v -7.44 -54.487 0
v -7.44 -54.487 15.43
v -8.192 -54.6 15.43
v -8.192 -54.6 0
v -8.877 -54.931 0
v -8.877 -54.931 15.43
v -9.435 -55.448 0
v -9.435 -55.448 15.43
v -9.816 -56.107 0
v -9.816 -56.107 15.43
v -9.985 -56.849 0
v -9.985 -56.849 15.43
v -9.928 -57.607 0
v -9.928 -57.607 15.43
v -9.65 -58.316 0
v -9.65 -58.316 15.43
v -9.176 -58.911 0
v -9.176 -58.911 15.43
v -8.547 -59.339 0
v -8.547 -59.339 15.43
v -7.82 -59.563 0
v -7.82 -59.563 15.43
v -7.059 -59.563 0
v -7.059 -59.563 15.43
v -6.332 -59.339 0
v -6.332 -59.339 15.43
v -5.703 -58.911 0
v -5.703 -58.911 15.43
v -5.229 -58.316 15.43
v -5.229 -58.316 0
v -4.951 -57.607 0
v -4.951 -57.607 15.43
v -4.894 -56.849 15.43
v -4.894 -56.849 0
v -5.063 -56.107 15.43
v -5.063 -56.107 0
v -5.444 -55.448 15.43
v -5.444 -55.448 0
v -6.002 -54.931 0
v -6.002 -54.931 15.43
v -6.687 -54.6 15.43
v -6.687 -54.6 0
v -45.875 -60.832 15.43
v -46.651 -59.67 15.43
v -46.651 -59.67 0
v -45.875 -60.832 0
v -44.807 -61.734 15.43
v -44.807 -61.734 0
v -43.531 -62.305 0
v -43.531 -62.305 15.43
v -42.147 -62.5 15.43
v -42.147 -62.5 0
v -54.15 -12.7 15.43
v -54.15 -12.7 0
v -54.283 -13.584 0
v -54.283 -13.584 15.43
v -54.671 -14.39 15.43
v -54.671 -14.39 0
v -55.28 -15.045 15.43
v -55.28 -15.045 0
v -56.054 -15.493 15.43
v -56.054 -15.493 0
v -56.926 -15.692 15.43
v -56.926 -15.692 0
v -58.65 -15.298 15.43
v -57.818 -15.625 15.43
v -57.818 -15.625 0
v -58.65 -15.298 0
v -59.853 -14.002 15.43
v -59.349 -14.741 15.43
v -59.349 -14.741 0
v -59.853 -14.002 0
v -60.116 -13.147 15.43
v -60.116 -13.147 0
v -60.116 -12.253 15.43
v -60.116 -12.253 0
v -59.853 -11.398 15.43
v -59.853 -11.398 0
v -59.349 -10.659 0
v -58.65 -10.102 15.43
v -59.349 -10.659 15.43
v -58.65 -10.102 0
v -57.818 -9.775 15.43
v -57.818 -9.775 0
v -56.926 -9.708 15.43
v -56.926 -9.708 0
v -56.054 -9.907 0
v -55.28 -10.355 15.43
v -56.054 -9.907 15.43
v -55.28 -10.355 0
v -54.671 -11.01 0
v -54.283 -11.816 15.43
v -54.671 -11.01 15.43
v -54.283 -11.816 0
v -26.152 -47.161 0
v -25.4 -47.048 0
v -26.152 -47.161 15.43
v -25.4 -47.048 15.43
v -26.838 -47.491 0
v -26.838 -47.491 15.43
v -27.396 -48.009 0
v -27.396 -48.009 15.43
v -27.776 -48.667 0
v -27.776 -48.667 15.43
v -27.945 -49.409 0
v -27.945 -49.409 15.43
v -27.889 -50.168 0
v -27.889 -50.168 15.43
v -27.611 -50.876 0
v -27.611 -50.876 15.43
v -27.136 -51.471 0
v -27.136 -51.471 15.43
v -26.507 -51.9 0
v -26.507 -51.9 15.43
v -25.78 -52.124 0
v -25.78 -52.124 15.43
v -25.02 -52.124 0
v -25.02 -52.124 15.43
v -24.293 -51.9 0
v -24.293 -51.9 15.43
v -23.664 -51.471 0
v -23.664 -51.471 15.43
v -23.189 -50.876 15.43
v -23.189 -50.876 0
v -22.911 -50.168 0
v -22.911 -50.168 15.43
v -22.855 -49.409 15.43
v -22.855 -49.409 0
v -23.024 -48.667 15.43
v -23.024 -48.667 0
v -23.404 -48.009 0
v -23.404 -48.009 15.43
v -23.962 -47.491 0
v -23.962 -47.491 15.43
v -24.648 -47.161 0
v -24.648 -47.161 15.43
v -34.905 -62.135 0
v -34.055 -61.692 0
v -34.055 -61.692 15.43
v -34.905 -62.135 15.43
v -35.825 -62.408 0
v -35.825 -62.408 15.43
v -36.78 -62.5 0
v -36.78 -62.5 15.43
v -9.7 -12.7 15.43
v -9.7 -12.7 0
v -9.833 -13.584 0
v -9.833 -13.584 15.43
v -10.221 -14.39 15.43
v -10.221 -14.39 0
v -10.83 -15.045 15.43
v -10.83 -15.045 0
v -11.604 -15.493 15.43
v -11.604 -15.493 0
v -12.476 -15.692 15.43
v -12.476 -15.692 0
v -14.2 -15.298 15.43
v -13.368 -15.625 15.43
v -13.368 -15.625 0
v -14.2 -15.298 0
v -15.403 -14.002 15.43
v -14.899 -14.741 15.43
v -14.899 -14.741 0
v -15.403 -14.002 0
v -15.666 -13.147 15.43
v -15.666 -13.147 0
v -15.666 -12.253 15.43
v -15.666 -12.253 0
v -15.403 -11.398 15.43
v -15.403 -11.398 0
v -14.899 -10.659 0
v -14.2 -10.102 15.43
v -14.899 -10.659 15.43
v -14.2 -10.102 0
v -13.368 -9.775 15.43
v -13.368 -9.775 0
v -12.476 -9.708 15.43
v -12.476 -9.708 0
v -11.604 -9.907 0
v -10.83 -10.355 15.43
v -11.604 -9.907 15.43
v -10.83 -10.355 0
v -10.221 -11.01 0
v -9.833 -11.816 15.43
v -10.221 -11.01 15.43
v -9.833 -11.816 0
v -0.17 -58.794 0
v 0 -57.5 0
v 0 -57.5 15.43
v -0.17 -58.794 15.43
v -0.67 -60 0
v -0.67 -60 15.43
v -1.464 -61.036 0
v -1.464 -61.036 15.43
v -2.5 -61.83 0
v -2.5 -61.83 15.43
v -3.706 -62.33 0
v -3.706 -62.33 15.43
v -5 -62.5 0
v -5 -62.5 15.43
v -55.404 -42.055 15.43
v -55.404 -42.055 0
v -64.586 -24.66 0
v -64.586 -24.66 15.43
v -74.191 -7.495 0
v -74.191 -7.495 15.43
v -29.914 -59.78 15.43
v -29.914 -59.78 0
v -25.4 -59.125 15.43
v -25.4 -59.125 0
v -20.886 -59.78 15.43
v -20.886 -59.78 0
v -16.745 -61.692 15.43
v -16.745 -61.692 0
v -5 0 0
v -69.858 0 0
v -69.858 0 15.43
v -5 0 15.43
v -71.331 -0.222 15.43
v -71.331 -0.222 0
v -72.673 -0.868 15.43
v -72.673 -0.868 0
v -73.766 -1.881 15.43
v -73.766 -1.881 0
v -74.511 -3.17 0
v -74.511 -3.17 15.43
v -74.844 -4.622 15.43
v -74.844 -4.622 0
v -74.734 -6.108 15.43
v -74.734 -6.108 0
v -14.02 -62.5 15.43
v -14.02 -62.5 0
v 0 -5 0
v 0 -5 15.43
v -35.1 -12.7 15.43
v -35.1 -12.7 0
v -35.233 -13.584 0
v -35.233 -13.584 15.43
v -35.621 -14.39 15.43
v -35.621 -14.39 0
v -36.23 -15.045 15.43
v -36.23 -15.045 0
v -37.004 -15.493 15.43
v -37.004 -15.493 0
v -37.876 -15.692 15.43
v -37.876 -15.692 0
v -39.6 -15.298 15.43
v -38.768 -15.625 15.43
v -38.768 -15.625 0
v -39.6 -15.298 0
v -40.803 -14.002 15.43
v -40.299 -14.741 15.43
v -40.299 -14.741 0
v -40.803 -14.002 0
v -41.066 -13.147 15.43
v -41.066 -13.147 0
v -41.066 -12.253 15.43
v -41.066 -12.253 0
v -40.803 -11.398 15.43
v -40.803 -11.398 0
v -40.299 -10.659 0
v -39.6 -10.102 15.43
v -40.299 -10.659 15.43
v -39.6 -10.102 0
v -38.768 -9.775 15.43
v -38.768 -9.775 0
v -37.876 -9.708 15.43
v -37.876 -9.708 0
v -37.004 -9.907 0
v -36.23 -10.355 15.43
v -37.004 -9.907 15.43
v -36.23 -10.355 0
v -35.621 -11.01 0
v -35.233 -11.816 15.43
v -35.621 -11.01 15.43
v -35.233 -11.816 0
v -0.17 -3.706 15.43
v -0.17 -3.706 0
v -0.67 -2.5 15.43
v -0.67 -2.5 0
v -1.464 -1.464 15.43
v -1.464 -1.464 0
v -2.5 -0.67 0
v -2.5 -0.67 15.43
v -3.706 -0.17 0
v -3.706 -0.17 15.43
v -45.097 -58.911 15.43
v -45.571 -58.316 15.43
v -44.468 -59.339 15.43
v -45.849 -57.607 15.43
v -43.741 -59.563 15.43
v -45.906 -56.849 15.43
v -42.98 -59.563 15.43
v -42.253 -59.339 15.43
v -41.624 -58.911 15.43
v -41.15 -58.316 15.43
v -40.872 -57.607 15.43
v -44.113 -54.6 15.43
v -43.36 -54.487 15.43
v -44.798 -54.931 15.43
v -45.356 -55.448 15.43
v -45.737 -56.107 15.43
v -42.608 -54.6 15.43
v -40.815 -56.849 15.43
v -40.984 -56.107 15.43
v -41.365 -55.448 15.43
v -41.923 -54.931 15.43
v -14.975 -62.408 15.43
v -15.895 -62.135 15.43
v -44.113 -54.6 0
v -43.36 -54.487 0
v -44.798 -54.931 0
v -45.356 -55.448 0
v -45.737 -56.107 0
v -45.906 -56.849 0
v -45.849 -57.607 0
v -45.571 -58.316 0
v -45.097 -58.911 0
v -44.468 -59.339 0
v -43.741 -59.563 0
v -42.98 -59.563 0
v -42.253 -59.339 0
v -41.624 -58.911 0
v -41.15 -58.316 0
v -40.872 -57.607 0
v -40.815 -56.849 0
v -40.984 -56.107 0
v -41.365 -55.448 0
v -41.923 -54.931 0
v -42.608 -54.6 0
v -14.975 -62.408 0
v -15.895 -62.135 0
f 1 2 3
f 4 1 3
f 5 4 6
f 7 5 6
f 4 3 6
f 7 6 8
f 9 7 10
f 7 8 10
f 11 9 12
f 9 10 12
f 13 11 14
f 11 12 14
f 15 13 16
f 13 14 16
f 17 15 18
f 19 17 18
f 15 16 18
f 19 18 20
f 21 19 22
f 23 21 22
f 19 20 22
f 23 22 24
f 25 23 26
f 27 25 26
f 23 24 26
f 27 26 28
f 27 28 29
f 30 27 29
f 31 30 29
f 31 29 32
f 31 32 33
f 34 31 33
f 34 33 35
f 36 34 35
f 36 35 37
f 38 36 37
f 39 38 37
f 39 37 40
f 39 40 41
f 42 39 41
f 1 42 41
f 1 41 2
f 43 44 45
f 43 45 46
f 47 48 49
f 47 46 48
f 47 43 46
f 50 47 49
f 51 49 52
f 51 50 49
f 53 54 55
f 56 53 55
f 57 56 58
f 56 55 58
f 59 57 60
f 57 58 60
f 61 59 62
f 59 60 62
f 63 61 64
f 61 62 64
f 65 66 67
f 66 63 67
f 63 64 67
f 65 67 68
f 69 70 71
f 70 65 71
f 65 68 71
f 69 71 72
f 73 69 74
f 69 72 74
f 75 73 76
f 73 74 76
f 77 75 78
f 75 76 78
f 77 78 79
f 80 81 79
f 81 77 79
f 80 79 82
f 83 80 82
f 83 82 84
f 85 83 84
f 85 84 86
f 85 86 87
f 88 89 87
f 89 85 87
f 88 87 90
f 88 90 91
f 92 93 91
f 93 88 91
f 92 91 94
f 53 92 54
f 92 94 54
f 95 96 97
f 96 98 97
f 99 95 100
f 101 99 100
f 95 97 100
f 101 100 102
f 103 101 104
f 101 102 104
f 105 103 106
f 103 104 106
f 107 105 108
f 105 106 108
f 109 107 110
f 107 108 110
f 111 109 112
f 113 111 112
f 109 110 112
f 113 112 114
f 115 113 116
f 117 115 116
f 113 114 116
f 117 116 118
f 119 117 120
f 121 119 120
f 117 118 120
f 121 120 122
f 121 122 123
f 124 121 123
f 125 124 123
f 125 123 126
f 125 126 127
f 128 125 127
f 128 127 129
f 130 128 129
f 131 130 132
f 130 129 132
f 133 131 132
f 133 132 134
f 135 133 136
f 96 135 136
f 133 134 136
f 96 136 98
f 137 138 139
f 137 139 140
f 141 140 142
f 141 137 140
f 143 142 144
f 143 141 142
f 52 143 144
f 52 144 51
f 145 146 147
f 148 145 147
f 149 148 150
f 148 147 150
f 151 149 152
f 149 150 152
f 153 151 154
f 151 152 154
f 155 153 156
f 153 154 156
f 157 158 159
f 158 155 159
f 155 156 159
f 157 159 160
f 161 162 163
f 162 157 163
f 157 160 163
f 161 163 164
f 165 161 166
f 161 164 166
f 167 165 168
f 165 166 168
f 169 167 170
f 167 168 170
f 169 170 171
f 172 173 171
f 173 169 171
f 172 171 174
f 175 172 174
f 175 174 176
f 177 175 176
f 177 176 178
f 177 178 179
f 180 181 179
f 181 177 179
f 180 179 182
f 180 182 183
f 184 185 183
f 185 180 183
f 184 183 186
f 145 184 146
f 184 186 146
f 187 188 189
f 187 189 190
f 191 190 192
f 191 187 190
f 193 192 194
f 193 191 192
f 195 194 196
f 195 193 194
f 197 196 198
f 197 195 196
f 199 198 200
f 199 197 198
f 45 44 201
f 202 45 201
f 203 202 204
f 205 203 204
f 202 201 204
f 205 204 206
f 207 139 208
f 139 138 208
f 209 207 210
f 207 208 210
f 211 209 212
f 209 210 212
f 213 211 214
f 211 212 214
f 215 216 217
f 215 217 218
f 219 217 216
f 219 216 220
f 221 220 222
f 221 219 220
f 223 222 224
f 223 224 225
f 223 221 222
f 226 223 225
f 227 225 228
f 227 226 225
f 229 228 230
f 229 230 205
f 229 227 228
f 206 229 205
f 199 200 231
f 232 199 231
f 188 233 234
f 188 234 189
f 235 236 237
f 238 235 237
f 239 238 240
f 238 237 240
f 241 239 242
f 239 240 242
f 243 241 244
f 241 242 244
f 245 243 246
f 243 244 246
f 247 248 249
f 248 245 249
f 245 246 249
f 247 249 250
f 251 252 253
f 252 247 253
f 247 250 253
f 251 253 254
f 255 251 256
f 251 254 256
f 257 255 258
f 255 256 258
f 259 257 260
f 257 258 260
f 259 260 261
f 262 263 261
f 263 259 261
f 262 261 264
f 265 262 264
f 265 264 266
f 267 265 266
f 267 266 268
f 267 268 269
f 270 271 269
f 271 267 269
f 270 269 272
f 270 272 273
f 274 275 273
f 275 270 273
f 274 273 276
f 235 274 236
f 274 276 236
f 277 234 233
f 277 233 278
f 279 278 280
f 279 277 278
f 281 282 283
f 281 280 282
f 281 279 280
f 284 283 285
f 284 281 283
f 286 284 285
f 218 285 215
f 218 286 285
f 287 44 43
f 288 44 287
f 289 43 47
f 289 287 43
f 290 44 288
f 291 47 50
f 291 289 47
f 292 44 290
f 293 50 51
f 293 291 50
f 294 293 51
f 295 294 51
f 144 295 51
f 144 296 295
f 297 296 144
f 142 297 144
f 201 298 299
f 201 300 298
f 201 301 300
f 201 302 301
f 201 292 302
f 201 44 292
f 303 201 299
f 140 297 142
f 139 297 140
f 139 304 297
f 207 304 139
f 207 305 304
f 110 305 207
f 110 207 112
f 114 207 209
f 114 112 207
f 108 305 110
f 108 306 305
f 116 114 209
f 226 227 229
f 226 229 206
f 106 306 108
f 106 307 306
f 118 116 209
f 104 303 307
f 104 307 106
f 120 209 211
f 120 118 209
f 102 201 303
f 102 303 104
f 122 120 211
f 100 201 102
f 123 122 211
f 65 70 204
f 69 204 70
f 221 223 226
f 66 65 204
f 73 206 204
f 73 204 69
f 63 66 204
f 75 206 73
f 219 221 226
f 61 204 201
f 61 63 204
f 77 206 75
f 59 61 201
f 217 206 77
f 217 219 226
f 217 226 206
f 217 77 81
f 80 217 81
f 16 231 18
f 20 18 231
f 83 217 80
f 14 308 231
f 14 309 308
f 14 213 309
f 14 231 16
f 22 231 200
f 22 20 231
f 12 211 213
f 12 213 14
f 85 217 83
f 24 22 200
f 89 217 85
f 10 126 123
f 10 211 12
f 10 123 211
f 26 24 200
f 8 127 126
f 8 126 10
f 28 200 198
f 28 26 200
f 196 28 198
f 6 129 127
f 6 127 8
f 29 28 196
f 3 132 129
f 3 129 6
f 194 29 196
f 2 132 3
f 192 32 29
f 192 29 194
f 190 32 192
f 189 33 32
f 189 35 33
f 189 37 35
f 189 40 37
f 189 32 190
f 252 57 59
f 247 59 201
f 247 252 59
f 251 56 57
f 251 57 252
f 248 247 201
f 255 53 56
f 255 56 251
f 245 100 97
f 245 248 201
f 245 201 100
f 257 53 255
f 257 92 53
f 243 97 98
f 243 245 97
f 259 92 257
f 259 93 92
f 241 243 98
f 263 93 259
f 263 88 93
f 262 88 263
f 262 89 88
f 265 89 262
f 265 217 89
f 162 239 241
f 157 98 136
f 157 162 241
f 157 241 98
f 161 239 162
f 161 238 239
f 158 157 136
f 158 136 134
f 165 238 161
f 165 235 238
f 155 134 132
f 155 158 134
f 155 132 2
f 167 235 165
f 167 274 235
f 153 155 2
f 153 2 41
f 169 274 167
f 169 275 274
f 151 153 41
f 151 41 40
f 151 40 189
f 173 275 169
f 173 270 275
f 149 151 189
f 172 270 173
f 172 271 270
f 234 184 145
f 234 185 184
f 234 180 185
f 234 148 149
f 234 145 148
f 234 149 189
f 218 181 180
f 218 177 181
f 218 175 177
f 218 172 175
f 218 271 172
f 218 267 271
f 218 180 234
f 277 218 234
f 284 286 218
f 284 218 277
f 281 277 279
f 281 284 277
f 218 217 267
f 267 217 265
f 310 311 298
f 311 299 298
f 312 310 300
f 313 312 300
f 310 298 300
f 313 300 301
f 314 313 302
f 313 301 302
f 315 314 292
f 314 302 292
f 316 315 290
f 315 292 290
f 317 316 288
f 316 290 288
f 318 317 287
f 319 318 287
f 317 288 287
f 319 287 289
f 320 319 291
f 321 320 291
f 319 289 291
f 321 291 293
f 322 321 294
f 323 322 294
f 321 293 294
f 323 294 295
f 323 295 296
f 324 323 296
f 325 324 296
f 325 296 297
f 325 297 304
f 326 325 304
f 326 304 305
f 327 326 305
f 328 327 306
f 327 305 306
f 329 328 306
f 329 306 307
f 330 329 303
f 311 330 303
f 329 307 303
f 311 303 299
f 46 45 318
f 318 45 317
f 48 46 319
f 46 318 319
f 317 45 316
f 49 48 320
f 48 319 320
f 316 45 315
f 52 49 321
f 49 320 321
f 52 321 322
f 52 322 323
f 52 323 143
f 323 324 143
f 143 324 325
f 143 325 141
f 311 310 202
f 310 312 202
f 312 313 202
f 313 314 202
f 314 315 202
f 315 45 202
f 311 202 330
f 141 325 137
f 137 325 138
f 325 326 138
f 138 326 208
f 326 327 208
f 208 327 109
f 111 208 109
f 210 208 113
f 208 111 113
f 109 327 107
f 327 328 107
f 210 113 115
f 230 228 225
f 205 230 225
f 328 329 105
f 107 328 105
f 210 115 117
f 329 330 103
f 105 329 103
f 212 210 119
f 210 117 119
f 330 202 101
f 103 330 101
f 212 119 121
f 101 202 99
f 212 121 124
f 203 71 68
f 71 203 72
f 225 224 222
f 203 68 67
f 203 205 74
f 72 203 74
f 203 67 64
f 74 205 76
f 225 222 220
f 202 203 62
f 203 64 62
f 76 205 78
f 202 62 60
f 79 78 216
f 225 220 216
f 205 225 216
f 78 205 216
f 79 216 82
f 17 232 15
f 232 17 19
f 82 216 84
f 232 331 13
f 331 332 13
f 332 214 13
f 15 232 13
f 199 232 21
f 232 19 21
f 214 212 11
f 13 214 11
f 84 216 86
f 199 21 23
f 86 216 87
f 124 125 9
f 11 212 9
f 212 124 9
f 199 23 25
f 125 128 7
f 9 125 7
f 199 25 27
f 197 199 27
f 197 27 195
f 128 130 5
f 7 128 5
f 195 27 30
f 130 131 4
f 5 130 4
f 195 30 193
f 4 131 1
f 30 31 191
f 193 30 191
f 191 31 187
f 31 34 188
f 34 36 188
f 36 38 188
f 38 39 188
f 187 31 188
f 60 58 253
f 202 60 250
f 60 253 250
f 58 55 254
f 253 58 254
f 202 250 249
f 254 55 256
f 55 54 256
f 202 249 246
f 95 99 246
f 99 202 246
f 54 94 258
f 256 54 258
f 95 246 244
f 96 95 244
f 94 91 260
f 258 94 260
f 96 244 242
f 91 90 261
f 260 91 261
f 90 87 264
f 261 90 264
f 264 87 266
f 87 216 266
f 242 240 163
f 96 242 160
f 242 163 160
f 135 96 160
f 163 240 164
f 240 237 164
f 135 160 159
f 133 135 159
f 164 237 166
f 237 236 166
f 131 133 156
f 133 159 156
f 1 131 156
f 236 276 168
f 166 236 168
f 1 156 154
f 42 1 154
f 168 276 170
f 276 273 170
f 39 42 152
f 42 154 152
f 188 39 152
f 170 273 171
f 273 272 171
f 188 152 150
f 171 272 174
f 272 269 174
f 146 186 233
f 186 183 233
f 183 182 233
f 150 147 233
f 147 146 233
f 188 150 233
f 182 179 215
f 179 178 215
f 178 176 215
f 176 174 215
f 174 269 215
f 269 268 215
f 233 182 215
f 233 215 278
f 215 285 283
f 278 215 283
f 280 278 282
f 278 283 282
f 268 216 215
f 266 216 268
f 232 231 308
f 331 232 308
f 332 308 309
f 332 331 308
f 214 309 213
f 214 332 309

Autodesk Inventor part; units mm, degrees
ref_plane "YZ Plane" through (0, 0, 0) normal (1, 0, 0) x (0, 1, 0)
ref_plane "XZ Plane" through (0, 0, 0) normal (0, 1, 0) x (-1, 0, 0)
ref_plane "XY Plane" through (0, 0, 0) normal (0, 0, 1) x (1, 0, 0)
sketch "Sketch1" plane through (0, 0, 0) normal (0, 0, 1) x (1, 0, 0)
  line L0 (-110, -20.8494) -> (-110, 0)
  line L1 (-110, 0) -> (0, 0)
  line L2 (0, 0) -> (0, -105)
  line L3 (0, -105) -> (-39.3892, -105)
  line L4 (-110, -20.8494) -> (-119.38, 0) construction
  line L5 (-119.38, 0) -> (-110, 0) construction
  line L6 (-50.8, -25.4) -> (0, -25.4) construction
  line L7 (0, -25.4) -> (0, 0) construction
  line L8 (0, 0) -> (-50.8, 0) construction
  line L9 (-50.8, 0) -> (-50.8, -25.4) construction
  line L10 (-50.8, -25.4) -> (0, 0) construction
  line L11 (0, -25.4) -> (-50.8, 0) construction
  circle A0 centre (-12.7, -12.7) radius 3
  circle A1 centre (-38.1, -12.7) radius 3
  circle A2 centre (-25.4, -75) radius 15.875
  circle A3 centre (-25.4, -75) radius 30
  line L12 (-50.8, -90.9637) -> (-50.8, -59.0363)
  line L13 (-110, -4.7091) -> (-83.2932, 0)
  arc A4 (-56.3982, -84.7295) -> (-61.7755, -78.3211) centre (-62.3821, -84.2903) ccw
  line L14 (-39.3892, -105) -> (-56.3982, -84.7295)
  arc A5 (-85.9963, -49.4559) -> (-100.0831, -32.6679) centre (-102.5, -49) ccw
  line L15 (-61.7755, -78.3211) -> (-85.9963, -49.4559)
  line L16 (-100.0831, -32.6679) -> (-110, -20.8494)
  circle A6 centre (-95.25, -12.7) radius 3
  circle A7 centre (-57.15, -12.7) radius 3
  point P0 (0, 0)
  point P1 (-25.4, -12.7)
  point P2 (-25.4, -25.4)
  point P3 (-50.8, -75)
  point P4 (0, -90.9637)
  point P5 (-110, -10.4247)
  point P6 (-48.3813, -94.2836)
  point P7 (0, -59.0363)
  point P8 (-25.4, -105)
  dimension "d1" = 119.38
  dimension "d2" = 50.8
  dimension "d3" = 25.4
  dimension "d4" = 25.4
  dimension "d5" = 12.7
  dimension "d6" = 6
  dimension "d7" = 6
  dimension "d11" = 110
  dimension "d12" = 60
  dimension "d13" = 25.4
  dimension "d14" = 25.4
  dimension "d17" = 20.8494
  dimension "d18" = 31.75
  dimension "d21" = 170
  dimension "d22" = 26.7068
  dimension "d24" = 86.6409
  dimension "d25" = 12
  dimension "d26" = 47.6179
  dimension "d28" = 81.3659
  dimension "d29" = 33.02
  dimension "d30" = 49
  dimension "d31" = 50
  dimension "d41" = 19.05
  dimension "d42" = 38.1
extrude "Extrusion1" add sketch "Sketch1" along normal blind 15.4305 contours L0 L13 L1 L2 A3 L14 A4 L15 A5 L16 | L2 A3 L12 | L12 A3
fillet "Fillet1" radius 6 8 edges at (0, -90.9637, 7.7153) (-110, -20.8494, 7.7153) (-110, -4.7091, 7.7153) (-83.2932, 0, 7.7153) (-56.3982, -84.7295, 7.7153) (-61.7755, -78.3211, 7.7153) (-85.9963, -49.4559, 7.7153) (-100.0831, -32.6679, 7.7153)
sketch "Sketch2" plane through (0, 0, 0) normal (0, 0, -1) x (-1, 0, 0)
  circle A0 centre (25.4, -75) radius 15.875 projected
  circle A1 centre (25.4, -75) radius 25.4
  line L0 (7.4395, -92.9605) -> (7.4395, -57.0395)
  line L1 (43.3605, -57.0395) -> (43.3605, -92.9605)
  line L2 (7.4395, -92.9605) -> (25.4, -75)
  line L3 (25.4, -75) -> (43.3605, -57.0395)
  point P0 (0, 0)
  point P1 (25.4, -100.4)
  point P2 (25.4, -49.6)
  dimension "d32" = 50.8
  dimension "d33" = 45
hole "Hole1" at (-7.4395, -92.9605, 0) at (-7.4395, -57.0395, 0) at (-43.3605, -57.0395, 0) at (-43.3605, -92.9605, 0) at (-25.4, -100.4, 0) at (-25.4, -49.6, 0) direction (0, 0, 1) diameter 5.105 end through all clearance for "Flat Head Machine Screw (82)" size "#10" standard "Ansi Unified Screw Threads"
sketch "Sketch3" plane through (0, 0, 0) normal (0, 0, -1) x (-1, 0, 0)
  circle A0 centre (25.4, -49.6) radius 2.5525 construction
  circle A1 centre (25.4, -100.4) radius 2.5525 construction
  circle A2 centre (43.3605, -92.9605) radius 2.5525 construction
  circle A3 centre (43.3605, -57.0395) radius 2.5525 construction
  circle A4 centre (7.4395, -57.0395) radius 2.5525 construction
  circle A5 centre (7.4395, -92.9605) radius 2.5525 construction
  arc A6 (98.3371, -33.0234) -> (101.4205, -31.074) centre (96.8242, -27.2173) ccw construction
  line L0 (108.5963, -22.5223) -> (101.4205, -31.074) construction
  arc A7 (108.5963, -22.5223) -> (110, -18.6655) centre (104, -18.6655) ccw construction
  line L1 (110, -9.7437) -> (110, -18.6655) construction
  arc A8 (110, -9.7437) -> (105.0419, -3.8349) centre (104, -9.7437) ccw construction
  line L2 (83.8101, -0.0912) -> (105.0419, -3.8349) construction
  arc A9 (83.8101, -0.0912) -> (82.7682, 0) centre (82.7682, -6) ccw construction
  line L3 (0, 0) -> (82.7682, 0) projected
  line L4 (0, -89.1294) -> (0, 0) projected
  arc A10 (0, -89.1294) -> (1.15, -92.6618) centre (6, -89.1294) ccw construction
  arc A11 (1.15, -92.6618) -> (48.3813, -94.2836) centre (25.4, -75) ccw construction
  line L5 (55.1309, -86.2398) -> (48.3813, -94.2836) construction
  arc A12 (55.1309, -86.2398) -> (56.4584, -83.3367) centre (50.5346, -82.3831) ccw construction
  arc A13 (60.4143, -78.6222) -> (56.4584, -83.3367) centre (62.3821, -84.2903) ccw construction
  arc A14 (60.4143, -78.6222) -> (63.0428, -76.8108) centre (58.4465, -72.954) ccw construction
  line L6 (84.6589, -51.0497) -> (63.0428, -76.8108) construction
  arc A15 (84.6589, -51.0497) -> (86.0433, -47.6746) centre (80.0627, -47.193) ccw construction
  arc A16 (98.3371, -33.0234) -> (86.0433, -47.6746) centre (102.5, -49) ccw construction
  circle A17 centre (25.4, -75) radius 15.875 construction
  circle A18 centre (38.1, -12.7) radius 3 construction
  circle A19 centre (12.7, -12.7) radius 3 construction
  circle A20 centre (95.25, -12.7) radius 3 construction
  circle A21 centre (57.15, -12.7) radius 3 construction
  line L7 (0, -62.5) -> (45.2947, -62.5)
  arc A22 (78.5605, 0) -> (45.2947, -62.5) centre (770.086, -408.1685) ccw
  arc A23 (75.8423, -7.7632) -> (9.6381, -155.1512) centre (770.086, -408.1685) ccw construction
  point P0 (0, 0)
  dimension "d43" = 803
  dimension "d44" = 62.5
extrude "Extrusion2" cut sketch "Sketch3" along normal through all both and the other way through all keep common part
fillet "Fillet2" radius 5 6 edges at (-78.5605, 0, 7.7153) (-45.2947, -62.5, 7.7153) (-15.614, -62.5, 7.7153) (-35.186, -62.5, 7.7153) (0, -62.5, 7.7153) (0, 0, 7.7153)
equation "\"d5\" = 0.5 * d4"
equation "\"d7\" = d6"
equation "\"d14\" = d13"
properties part number "SPACER,INTAKE,LINEAR" material "3D Print Material - chopped carbon Nylon12 (preferred)"
